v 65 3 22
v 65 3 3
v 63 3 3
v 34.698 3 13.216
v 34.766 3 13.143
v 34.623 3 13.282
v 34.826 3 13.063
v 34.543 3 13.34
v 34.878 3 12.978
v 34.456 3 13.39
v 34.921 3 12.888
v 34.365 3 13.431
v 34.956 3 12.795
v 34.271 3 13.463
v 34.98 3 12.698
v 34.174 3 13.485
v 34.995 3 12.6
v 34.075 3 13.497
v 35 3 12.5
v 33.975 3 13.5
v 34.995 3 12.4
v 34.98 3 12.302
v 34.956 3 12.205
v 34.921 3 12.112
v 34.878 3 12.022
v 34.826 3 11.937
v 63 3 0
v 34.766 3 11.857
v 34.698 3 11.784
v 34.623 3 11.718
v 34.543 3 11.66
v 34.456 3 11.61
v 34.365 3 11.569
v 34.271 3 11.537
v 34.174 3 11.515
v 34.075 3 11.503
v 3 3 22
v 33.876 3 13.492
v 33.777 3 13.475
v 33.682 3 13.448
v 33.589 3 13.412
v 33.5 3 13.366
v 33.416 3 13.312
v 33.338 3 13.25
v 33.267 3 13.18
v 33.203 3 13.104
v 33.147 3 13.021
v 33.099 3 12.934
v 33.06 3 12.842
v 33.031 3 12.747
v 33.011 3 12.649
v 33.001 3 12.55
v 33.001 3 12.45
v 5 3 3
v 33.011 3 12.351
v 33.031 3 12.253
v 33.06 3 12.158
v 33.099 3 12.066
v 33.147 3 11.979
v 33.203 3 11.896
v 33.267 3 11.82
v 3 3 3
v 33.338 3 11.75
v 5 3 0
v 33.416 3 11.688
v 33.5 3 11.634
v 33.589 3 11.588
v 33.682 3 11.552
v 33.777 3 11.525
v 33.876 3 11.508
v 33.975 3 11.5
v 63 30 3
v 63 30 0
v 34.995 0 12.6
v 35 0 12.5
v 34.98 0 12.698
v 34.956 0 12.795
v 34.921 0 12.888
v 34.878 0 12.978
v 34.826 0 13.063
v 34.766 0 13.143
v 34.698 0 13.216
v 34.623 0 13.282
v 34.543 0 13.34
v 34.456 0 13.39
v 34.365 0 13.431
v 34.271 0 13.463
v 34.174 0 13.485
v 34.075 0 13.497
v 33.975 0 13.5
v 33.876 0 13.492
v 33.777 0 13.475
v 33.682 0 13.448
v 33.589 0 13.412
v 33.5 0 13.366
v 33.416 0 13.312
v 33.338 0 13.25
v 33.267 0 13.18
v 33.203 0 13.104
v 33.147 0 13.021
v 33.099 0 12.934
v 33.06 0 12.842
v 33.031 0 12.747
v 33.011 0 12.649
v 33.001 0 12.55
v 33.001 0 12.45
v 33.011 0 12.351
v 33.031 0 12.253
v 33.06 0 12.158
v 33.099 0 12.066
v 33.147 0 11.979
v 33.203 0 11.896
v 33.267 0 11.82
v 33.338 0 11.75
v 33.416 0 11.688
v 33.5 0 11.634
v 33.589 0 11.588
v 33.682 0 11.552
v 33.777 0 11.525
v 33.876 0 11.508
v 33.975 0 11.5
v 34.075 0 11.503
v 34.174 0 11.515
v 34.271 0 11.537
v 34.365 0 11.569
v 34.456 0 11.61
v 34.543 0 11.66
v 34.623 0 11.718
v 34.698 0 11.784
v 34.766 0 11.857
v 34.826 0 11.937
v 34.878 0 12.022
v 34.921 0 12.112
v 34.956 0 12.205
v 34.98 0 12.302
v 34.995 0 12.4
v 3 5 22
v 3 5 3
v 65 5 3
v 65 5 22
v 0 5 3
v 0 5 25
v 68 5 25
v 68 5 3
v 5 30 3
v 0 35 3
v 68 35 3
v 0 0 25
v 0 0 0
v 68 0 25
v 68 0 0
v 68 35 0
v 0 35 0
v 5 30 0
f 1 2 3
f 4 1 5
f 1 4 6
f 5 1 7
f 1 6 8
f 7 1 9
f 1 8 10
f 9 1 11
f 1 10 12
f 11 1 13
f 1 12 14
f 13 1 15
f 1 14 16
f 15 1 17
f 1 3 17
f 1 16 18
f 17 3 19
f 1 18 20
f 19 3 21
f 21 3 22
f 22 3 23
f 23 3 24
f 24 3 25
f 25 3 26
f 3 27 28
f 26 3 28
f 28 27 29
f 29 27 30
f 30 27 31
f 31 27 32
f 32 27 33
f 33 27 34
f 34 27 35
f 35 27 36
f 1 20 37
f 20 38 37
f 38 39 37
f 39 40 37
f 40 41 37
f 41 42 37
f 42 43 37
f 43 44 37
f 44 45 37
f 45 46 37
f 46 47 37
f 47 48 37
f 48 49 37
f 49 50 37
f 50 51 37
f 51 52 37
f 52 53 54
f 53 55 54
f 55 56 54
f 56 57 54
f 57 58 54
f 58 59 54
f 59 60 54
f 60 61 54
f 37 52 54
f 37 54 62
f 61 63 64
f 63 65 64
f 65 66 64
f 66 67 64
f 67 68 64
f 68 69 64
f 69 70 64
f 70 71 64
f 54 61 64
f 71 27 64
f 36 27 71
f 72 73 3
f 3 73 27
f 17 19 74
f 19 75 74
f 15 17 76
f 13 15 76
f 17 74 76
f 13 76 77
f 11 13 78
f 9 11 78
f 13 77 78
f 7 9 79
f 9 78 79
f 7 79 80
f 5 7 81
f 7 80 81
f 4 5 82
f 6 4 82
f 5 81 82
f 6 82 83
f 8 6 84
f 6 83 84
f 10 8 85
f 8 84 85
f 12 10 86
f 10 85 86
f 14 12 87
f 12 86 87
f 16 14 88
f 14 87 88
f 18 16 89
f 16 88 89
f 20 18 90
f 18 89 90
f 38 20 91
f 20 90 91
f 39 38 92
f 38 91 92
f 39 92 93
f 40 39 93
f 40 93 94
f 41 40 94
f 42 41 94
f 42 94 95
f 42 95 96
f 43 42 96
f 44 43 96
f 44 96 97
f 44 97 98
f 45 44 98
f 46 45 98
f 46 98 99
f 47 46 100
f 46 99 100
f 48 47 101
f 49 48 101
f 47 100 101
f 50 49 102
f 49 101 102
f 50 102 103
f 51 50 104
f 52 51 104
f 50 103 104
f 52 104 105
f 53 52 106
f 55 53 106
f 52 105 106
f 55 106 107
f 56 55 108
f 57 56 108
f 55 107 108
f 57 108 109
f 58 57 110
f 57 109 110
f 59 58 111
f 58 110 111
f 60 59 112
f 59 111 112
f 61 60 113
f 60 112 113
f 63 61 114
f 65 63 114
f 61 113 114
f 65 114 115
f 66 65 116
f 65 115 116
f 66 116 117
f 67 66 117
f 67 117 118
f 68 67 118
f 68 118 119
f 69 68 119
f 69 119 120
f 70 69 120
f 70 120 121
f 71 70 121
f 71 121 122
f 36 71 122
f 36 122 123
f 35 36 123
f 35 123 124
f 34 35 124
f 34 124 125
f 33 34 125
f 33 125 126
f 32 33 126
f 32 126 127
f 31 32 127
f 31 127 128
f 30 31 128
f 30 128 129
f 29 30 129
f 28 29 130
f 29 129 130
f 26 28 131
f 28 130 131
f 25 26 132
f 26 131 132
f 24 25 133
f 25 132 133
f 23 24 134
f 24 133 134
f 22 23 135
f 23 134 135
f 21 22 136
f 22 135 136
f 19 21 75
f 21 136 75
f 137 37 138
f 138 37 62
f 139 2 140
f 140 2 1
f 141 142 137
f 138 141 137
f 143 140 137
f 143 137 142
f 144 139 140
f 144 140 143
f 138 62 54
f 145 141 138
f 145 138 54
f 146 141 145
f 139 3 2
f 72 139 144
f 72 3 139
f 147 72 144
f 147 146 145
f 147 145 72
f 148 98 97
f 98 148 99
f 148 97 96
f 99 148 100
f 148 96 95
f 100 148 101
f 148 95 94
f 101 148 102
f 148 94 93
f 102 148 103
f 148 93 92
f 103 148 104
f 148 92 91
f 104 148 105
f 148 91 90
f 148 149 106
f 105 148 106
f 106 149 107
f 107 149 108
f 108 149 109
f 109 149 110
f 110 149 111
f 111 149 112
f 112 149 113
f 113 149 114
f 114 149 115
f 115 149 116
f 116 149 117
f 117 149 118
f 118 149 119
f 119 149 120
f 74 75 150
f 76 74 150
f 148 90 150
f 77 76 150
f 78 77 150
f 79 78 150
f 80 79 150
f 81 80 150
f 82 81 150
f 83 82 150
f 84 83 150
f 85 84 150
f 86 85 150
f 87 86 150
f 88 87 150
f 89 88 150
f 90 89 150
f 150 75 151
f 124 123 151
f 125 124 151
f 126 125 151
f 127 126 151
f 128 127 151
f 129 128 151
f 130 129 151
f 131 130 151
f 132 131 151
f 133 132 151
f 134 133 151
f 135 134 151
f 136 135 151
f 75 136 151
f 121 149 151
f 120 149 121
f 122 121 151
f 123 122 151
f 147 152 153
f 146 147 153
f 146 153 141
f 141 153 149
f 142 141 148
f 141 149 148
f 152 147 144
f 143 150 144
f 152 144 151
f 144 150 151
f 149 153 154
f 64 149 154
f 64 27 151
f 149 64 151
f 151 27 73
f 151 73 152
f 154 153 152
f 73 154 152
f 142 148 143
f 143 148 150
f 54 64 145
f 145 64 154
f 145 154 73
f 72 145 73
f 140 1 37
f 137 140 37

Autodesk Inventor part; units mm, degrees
ref_plane "YZ Plane" through (0, 0, 0) normal (1, 0, 0) x (0, 1, 0)
ref_plane "XZ Plane" through (0, 0, 0) normal (0, 1, 0) x (-1, 0, 0)
ref_plane "XY Plane" through (0, 0, 0) normal (0, 0, 1) x (1, 0, 0)
sketch "Эскиз1" plane through (0, 0, 0) normal (0, 0, 1) x (1, 0, 0)
  line L0 (0, 0) -> (68, 0)
  line L1 (68, 0) -> (68, 35)
  line L2 (68, 35) -> (0, 35)
  line L3 (0, 35) -> (0, 0)
  line L4 (5, 30) -> (63, 30)
  line L5 (63, 30) -> (63, 3)
  line L6 (63, 3) -> (5, 3)
  line L7 (5, 3) -> (5, 30)
  line L8 (5, 3) -> (0, 3)
  line L9 (63, 3) -> (68, 3)
  dimension "d0" = 5
  dimension "d1" = 5
  dimension "d2" = 5
  dimension "d3" = 3
  dimension "d4" = 68
  dimension "d5" = 35
extrude "Выдавливание1" add sketch "Эскиз1" along normal blind 3 contours L3 L2 L1 L9 L5 L4 L7 L8
extrude "Выдавливание2" add sketch "Эскиз1" along normal blind 25 contours L3 L8 L6 L9 L1 L0
sketch "Эскиз2" plane through (0, 0, 0) normal (0, -1, 0) x (1, 0, 0)
  circle A0 centre (34, 12.5) radius 1
  line L0 (0, 0) -> (0, 25) projected
  line L1 (0, 25) -> (68, 25) projected
  point P0 (0, 12.5)
  point P1 (34, 25)
  dimension "d10" = 2
extrude "Выдавливание3" cut sketch "Эскиз2" against normal up to next
sketch "Эскиз3" plane through (5, 3, 0) normal (0, 1, 0) x (1, 0, 0)
  line L0 (-5, -25) -> (63, -25) projected
  line L1 (-5, -3) -> (-5, -25)
  line L2 (-5, -25) -> (63, -25)
  line L3 (63, -25) -> (63, -3)
  line L4 (63, -3) -> (60, -3)
  line L5 (60, -3) -> (60, -22)
  line L6 (60, -22) -> (-2, -22)
  line L7 (-2, -22) -> (-2, -3)
  line L8 (-2, -3) -> (-5, -3)
  line L9 (58, -3) -> (63, -3) projected
  point P0 (-5, 0)
  point P1 (60.5, -3)
  dimension "d13" = 3
  dimension "d14" = 3
  dimension "d15" = 3
extrude "Выдавливание4" add sketch "Эскиз3" along normal blind 2
properties part number "креплениедлякамерыниз"
